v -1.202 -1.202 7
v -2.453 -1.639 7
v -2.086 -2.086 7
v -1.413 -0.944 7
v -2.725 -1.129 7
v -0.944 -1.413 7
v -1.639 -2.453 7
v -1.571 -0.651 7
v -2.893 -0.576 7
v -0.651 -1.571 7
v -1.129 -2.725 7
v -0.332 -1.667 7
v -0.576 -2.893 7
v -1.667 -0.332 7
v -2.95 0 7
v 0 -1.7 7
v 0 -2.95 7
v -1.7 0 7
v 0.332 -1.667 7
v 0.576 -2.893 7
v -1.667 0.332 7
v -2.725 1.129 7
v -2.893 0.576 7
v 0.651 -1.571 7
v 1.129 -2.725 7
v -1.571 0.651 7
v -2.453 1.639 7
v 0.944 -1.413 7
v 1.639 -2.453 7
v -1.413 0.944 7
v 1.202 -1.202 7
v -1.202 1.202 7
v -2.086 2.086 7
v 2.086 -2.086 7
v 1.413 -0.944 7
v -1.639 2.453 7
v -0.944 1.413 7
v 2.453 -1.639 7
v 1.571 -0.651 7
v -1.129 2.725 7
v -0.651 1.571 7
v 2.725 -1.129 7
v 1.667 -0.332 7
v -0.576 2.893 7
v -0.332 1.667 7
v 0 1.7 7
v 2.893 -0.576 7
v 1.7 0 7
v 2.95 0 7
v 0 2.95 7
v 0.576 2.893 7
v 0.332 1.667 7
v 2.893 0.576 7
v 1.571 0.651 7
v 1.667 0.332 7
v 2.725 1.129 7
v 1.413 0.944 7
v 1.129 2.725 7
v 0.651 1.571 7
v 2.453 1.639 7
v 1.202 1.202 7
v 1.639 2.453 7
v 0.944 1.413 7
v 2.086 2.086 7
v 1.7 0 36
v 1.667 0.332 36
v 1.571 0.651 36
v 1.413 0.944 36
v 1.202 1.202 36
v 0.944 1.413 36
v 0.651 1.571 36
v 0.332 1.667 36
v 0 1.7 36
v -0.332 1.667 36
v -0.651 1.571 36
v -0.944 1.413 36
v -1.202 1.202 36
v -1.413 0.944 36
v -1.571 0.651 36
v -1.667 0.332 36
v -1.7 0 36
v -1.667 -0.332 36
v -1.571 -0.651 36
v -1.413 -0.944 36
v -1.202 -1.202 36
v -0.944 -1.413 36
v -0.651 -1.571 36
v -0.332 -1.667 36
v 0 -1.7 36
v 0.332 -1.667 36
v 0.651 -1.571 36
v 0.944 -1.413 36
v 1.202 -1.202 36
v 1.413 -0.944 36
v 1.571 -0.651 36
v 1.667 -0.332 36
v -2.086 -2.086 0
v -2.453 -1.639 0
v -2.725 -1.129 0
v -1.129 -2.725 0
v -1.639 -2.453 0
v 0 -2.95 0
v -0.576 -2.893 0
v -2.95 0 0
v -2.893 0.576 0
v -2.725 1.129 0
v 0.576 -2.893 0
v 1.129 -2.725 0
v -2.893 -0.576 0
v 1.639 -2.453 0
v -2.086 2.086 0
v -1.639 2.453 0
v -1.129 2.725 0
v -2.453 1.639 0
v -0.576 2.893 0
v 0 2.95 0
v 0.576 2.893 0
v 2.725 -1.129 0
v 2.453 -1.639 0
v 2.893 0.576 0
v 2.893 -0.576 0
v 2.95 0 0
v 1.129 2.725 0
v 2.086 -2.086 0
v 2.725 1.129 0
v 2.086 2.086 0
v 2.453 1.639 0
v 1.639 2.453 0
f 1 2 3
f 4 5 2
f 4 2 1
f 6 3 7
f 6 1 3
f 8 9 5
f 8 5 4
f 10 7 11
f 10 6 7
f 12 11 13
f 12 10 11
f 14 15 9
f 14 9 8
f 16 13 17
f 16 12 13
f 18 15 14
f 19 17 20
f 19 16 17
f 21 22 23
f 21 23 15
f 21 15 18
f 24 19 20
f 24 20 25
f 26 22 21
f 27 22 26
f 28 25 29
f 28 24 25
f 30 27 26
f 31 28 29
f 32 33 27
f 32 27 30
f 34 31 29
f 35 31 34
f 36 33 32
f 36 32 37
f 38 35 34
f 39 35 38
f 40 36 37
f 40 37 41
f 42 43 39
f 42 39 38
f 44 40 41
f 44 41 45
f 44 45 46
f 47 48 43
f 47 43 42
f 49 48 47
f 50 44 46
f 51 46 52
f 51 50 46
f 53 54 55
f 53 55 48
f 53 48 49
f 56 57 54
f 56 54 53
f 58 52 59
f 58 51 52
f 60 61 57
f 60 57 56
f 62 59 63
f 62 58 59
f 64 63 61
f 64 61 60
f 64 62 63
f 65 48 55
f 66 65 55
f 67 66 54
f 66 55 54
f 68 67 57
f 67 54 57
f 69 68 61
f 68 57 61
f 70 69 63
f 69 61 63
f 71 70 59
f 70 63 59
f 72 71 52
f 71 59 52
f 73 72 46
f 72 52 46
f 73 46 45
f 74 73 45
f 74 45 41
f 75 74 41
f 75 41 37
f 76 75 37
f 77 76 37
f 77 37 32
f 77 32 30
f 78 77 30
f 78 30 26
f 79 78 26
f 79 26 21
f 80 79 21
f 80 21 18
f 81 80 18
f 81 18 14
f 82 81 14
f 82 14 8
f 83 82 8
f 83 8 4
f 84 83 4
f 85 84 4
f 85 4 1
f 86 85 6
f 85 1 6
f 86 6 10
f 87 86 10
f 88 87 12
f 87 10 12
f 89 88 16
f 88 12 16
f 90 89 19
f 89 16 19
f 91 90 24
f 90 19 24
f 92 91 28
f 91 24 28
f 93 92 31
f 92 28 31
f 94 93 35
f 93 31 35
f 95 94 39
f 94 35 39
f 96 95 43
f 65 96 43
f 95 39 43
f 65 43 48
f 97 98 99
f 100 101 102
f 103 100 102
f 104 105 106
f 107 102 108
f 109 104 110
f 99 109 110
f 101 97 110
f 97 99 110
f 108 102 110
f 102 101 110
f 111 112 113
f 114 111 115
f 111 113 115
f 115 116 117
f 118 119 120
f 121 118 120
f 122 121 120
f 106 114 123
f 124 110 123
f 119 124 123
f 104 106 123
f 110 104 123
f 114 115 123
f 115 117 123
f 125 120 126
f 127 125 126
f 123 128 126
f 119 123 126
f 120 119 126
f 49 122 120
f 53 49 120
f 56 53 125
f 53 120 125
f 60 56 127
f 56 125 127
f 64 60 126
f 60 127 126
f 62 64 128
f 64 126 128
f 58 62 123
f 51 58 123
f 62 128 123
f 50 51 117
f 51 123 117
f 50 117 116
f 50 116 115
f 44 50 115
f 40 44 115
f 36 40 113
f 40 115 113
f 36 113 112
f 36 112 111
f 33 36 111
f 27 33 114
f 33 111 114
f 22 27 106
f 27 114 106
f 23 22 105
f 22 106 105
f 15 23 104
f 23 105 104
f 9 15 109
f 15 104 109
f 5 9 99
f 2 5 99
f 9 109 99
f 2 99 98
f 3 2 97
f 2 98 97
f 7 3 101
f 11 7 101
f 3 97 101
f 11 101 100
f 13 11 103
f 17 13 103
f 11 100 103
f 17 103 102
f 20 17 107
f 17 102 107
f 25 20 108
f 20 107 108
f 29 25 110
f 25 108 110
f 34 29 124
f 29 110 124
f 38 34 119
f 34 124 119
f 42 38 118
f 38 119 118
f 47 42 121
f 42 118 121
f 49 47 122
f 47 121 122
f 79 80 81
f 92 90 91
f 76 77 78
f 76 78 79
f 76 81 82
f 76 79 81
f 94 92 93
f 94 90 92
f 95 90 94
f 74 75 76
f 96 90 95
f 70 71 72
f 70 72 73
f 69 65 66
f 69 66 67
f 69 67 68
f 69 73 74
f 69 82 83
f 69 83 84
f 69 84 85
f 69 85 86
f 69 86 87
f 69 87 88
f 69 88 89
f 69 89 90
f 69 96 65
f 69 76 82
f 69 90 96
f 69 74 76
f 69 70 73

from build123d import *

# Parameters (mm, degrees)
CYLINDER_R        = 2.95
CYLINDER_DEPTH    = 7
CYLINDER001_R     = 1.7
CYLINDER001_DEPTH = 30


with BuildPart() as m3bolthead:
    # Cylinder → Cylinder (new body)
    with BuildSketch(Plane.XY):
        Circle(CYLINDER_R)
    extrude(amount=CYLINDER_DEPTH)


with BuildPart() as m3bolt:
    # Cylinder001 → Cylinder001 (new body)
    with BuildSketch(Plane.XY.offset(6)):
        Circle(CYLINDER001_R)
    extrude(amount=CYLINDER001_DEPTH)

    # Fusion: union M3BoltHead
    add(m3bolthead.part)


solid = m3bolt.part
